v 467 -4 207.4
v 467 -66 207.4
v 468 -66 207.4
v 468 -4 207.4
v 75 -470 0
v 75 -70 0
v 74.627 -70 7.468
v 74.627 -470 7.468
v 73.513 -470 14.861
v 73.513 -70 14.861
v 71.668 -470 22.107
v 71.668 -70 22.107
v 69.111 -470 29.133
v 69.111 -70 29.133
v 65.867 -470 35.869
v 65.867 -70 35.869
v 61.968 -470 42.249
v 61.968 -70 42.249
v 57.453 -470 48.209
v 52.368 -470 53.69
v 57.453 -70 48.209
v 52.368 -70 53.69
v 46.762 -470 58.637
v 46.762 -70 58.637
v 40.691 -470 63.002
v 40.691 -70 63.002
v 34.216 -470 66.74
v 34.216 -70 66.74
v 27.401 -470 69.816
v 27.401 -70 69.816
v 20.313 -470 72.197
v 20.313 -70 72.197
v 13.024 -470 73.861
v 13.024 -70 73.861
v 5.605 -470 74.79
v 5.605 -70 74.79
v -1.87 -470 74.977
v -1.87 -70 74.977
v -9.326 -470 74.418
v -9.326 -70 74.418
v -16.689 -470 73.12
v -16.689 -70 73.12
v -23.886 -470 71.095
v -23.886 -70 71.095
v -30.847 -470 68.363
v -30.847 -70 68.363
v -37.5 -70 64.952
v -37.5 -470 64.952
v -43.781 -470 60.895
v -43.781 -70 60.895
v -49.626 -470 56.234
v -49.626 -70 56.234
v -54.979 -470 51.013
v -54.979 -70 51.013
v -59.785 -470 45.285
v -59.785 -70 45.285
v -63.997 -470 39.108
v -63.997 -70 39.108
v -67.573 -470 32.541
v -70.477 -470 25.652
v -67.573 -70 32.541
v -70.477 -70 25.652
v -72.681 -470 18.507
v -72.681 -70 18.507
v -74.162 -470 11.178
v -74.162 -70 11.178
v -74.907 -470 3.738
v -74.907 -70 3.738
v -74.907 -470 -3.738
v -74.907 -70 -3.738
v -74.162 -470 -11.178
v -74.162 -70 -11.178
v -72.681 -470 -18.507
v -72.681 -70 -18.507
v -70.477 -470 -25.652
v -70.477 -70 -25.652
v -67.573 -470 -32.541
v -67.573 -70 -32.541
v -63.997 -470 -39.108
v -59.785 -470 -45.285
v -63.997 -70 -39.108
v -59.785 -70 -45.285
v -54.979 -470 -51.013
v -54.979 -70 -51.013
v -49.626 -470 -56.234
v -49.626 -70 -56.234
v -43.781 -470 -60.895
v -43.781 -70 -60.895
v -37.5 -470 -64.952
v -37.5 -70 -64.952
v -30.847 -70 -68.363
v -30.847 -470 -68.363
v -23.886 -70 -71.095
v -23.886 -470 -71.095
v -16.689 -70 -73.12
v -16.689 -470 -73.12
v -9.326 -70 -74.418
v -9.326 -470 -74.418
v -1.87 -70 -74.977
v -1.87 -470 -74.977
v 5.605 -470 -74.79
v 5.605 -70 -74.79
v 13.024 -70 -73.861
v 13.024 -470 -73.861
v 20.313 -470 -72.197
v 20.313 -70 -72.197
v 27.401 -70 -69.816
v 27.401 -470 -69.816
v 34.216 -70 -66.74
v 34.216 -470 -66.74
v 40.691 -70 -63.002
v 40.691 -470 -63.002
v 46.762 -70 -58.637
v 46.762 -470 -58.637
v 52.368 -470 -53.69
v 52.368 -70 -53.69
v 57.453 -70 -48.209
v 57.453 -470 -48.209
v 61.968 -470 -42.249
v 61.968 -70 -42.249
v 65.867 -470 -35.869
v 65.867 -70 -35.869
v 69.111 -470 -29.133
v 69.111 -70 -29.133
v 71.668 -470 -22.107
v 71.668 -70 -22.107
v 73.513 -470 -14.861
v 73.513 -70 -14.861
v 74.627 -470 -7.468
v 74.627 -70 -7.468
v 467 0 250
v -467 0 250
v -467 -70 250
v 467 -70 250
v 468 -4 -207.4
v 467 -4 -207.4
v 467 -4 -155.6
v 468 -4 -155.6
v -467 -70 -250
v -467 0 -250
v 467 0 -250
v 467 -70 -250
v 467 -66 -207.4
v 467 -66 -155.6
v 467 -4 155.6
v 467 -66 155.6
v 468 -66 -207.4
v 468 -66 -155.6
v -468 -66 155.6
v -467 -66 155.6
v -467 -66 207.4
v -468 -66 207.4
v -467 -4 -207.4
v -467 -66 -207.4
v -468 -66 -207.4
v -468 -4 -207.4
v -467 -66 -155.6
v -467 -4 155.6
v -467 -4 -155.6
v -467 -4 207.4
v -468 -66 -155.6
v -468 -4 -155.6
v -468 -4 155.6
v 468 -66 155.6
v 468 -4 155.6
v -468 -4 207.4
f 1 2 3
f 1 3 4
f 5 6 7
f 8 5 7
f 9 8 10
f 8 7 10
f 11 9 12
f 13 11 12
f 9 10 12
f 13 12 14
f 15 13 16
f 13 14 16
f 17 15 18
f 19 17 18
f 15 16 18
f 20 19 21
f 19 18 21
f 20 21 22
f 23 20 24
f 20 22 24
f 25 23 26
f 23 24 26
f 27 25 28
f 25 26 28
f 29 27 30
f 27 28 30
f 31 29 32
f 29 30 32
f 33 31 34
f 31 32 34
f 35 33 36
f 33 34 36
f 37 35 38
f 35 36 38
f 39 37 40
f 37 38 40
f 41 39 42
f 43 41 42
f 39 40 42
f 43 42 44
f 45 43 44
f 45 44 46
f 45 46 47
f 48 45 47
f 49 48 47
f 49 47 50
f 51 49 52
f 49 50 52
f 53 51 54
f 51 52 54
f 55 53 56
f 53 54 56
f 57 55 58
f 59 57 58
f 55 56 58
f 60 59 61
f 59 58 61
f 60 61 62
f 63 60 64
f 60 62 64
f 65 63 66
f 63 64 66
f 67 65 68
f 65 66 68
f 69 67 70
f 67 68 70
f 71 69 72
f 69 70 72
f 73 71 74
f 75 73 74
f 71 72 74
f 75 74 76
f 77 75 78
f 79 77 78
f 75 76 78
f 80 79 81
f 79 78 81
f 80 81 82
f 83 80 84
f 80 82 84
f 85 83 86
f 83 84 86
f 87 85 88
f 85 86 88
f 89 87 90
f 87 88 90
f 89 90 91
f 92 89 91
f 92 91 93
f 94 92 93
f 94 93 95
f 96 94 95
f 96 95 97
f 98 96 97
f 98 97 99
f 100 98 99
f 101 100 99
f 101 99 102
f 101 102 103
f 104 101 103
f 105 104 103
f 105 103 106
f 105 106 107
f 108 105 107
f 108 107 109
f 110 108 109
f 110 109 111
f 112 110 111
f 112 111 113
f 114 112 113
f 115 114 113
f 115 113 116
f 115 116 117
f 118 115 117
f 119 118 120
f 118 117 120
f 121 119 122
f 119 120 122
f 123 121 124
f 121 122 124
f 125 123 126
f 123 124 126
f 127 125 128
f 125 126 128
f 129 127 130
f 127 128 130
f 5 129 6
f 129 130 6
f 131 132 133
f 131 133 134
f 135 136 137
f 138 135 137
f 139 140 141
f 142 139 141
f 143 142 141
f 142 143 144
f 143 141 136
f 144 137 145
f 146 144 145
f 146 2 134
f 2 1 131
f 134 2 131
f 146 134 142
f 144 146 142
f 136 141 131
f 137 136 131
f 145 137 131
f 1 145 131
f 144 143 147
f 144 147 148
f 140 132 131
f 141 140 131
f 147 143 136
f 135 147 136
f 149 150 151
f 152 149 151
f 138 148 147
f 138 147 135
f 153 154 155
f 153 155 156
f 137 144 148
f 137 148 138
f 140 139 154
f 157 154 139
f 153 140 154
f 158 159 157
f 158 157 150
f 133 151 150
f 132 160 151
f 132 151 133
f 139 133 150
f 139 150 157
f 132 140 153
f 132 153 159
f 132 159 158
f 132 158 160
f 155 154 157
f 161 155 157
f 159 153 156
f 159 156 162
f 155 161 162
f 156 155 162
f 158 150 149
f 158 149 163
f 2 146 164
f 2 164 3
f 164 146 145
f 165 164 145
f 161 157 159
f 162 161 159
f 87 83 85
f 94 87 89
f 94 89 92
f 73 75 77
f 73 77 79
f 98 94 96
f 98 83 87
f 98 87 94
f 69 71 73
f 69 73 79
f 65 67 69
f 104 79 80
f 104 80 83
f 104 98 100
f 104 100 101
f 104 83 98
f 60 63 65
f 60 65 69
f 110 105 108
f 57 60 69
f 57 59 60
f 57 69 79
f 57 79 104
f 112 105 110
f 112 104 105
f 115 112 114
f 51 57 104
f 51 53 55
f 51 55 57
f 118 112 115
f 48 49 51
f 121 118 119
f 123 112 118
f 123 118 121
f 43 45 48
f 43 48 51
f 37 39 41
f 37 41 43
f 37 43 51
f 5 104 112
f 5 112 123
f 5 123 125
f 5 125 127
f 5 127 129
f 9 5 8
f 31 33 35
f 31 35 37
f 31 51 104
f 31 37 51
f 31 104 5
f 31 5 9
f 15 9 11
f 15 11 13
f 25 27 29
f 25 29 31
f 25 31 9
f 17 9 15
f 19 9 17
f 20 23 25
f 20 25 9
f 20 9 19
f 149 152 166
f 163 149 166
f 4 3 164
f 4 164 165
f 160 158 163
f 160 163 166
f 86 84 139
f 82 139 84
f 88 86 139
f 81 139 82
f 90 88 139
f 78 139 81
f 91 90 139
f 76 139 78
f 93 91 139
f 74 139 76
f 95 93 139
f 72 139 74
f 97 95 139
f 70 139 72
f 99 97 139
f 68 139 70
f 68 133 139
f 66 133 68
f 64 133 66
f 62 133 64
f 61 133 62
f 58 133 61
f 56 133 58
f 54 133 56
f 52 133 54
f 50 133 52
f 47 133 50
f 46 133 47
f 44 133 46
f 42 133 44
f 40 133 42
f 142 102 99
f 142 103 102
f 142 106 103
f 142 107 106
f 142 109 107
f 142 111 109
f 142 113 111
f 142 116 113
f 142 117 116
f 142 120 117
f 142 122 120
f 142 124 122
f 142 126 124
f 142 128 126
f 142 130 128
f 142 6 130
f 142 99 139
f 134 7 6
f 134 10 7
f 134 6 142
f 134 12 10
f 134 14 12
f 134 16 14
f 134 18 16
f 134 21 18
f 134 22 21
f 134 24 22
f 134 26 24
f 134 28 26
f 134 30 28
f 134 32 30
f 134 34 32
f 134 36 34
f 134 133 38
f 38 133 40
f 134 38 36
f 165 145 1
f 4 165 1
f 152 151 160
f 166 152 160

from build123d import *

# Parameters (mm, degrees)
F0_W     = 934
F0_H     = 500
F1_DEPTH = 70
F2_R     = 75
F3_DEPTH = 400
F4_W     = 62
F4_H     = 51.8
F5_DEPTH = 1


# Not quite as in the source:
# - a pattern or mirror of a feature is missing from the dataset's text; its kind, count and spacing are read off the source's solid


with BuildPart() as f1:
    # F0 (on Front) → F1 (new body)
    with BuildSketch(Plane.XZ):
        Rectangle(F0_W, F0_H)
    extrude(amount=F1_DEPTH)

    # F2 (on face) → F3 (join)
    with BuildSketch(Plane.XZ.offset(70)):
        Circle(F2_R)
    extrude(amount=F3_DEPTH)

    # F4 (on face) → F5 (join)
    with BuildSketch(Plane.YZ.offset(467)):
        with Locations((-35, 181.5)):
            Rectangle(F4_W, F4_H)
        with Locations((-35, -181.5)):
            Rectangle(F4_W, F4_H)
    f5 = extrude(amount=F5_DEPTH)

    # F5_copies: F5 across plane
    add(f5.mirror(Plane(origin=(0, 0, 0), x_dir=(0, 0, -1), z_dir=(-1, 0, 0))))


solid = f1.part
